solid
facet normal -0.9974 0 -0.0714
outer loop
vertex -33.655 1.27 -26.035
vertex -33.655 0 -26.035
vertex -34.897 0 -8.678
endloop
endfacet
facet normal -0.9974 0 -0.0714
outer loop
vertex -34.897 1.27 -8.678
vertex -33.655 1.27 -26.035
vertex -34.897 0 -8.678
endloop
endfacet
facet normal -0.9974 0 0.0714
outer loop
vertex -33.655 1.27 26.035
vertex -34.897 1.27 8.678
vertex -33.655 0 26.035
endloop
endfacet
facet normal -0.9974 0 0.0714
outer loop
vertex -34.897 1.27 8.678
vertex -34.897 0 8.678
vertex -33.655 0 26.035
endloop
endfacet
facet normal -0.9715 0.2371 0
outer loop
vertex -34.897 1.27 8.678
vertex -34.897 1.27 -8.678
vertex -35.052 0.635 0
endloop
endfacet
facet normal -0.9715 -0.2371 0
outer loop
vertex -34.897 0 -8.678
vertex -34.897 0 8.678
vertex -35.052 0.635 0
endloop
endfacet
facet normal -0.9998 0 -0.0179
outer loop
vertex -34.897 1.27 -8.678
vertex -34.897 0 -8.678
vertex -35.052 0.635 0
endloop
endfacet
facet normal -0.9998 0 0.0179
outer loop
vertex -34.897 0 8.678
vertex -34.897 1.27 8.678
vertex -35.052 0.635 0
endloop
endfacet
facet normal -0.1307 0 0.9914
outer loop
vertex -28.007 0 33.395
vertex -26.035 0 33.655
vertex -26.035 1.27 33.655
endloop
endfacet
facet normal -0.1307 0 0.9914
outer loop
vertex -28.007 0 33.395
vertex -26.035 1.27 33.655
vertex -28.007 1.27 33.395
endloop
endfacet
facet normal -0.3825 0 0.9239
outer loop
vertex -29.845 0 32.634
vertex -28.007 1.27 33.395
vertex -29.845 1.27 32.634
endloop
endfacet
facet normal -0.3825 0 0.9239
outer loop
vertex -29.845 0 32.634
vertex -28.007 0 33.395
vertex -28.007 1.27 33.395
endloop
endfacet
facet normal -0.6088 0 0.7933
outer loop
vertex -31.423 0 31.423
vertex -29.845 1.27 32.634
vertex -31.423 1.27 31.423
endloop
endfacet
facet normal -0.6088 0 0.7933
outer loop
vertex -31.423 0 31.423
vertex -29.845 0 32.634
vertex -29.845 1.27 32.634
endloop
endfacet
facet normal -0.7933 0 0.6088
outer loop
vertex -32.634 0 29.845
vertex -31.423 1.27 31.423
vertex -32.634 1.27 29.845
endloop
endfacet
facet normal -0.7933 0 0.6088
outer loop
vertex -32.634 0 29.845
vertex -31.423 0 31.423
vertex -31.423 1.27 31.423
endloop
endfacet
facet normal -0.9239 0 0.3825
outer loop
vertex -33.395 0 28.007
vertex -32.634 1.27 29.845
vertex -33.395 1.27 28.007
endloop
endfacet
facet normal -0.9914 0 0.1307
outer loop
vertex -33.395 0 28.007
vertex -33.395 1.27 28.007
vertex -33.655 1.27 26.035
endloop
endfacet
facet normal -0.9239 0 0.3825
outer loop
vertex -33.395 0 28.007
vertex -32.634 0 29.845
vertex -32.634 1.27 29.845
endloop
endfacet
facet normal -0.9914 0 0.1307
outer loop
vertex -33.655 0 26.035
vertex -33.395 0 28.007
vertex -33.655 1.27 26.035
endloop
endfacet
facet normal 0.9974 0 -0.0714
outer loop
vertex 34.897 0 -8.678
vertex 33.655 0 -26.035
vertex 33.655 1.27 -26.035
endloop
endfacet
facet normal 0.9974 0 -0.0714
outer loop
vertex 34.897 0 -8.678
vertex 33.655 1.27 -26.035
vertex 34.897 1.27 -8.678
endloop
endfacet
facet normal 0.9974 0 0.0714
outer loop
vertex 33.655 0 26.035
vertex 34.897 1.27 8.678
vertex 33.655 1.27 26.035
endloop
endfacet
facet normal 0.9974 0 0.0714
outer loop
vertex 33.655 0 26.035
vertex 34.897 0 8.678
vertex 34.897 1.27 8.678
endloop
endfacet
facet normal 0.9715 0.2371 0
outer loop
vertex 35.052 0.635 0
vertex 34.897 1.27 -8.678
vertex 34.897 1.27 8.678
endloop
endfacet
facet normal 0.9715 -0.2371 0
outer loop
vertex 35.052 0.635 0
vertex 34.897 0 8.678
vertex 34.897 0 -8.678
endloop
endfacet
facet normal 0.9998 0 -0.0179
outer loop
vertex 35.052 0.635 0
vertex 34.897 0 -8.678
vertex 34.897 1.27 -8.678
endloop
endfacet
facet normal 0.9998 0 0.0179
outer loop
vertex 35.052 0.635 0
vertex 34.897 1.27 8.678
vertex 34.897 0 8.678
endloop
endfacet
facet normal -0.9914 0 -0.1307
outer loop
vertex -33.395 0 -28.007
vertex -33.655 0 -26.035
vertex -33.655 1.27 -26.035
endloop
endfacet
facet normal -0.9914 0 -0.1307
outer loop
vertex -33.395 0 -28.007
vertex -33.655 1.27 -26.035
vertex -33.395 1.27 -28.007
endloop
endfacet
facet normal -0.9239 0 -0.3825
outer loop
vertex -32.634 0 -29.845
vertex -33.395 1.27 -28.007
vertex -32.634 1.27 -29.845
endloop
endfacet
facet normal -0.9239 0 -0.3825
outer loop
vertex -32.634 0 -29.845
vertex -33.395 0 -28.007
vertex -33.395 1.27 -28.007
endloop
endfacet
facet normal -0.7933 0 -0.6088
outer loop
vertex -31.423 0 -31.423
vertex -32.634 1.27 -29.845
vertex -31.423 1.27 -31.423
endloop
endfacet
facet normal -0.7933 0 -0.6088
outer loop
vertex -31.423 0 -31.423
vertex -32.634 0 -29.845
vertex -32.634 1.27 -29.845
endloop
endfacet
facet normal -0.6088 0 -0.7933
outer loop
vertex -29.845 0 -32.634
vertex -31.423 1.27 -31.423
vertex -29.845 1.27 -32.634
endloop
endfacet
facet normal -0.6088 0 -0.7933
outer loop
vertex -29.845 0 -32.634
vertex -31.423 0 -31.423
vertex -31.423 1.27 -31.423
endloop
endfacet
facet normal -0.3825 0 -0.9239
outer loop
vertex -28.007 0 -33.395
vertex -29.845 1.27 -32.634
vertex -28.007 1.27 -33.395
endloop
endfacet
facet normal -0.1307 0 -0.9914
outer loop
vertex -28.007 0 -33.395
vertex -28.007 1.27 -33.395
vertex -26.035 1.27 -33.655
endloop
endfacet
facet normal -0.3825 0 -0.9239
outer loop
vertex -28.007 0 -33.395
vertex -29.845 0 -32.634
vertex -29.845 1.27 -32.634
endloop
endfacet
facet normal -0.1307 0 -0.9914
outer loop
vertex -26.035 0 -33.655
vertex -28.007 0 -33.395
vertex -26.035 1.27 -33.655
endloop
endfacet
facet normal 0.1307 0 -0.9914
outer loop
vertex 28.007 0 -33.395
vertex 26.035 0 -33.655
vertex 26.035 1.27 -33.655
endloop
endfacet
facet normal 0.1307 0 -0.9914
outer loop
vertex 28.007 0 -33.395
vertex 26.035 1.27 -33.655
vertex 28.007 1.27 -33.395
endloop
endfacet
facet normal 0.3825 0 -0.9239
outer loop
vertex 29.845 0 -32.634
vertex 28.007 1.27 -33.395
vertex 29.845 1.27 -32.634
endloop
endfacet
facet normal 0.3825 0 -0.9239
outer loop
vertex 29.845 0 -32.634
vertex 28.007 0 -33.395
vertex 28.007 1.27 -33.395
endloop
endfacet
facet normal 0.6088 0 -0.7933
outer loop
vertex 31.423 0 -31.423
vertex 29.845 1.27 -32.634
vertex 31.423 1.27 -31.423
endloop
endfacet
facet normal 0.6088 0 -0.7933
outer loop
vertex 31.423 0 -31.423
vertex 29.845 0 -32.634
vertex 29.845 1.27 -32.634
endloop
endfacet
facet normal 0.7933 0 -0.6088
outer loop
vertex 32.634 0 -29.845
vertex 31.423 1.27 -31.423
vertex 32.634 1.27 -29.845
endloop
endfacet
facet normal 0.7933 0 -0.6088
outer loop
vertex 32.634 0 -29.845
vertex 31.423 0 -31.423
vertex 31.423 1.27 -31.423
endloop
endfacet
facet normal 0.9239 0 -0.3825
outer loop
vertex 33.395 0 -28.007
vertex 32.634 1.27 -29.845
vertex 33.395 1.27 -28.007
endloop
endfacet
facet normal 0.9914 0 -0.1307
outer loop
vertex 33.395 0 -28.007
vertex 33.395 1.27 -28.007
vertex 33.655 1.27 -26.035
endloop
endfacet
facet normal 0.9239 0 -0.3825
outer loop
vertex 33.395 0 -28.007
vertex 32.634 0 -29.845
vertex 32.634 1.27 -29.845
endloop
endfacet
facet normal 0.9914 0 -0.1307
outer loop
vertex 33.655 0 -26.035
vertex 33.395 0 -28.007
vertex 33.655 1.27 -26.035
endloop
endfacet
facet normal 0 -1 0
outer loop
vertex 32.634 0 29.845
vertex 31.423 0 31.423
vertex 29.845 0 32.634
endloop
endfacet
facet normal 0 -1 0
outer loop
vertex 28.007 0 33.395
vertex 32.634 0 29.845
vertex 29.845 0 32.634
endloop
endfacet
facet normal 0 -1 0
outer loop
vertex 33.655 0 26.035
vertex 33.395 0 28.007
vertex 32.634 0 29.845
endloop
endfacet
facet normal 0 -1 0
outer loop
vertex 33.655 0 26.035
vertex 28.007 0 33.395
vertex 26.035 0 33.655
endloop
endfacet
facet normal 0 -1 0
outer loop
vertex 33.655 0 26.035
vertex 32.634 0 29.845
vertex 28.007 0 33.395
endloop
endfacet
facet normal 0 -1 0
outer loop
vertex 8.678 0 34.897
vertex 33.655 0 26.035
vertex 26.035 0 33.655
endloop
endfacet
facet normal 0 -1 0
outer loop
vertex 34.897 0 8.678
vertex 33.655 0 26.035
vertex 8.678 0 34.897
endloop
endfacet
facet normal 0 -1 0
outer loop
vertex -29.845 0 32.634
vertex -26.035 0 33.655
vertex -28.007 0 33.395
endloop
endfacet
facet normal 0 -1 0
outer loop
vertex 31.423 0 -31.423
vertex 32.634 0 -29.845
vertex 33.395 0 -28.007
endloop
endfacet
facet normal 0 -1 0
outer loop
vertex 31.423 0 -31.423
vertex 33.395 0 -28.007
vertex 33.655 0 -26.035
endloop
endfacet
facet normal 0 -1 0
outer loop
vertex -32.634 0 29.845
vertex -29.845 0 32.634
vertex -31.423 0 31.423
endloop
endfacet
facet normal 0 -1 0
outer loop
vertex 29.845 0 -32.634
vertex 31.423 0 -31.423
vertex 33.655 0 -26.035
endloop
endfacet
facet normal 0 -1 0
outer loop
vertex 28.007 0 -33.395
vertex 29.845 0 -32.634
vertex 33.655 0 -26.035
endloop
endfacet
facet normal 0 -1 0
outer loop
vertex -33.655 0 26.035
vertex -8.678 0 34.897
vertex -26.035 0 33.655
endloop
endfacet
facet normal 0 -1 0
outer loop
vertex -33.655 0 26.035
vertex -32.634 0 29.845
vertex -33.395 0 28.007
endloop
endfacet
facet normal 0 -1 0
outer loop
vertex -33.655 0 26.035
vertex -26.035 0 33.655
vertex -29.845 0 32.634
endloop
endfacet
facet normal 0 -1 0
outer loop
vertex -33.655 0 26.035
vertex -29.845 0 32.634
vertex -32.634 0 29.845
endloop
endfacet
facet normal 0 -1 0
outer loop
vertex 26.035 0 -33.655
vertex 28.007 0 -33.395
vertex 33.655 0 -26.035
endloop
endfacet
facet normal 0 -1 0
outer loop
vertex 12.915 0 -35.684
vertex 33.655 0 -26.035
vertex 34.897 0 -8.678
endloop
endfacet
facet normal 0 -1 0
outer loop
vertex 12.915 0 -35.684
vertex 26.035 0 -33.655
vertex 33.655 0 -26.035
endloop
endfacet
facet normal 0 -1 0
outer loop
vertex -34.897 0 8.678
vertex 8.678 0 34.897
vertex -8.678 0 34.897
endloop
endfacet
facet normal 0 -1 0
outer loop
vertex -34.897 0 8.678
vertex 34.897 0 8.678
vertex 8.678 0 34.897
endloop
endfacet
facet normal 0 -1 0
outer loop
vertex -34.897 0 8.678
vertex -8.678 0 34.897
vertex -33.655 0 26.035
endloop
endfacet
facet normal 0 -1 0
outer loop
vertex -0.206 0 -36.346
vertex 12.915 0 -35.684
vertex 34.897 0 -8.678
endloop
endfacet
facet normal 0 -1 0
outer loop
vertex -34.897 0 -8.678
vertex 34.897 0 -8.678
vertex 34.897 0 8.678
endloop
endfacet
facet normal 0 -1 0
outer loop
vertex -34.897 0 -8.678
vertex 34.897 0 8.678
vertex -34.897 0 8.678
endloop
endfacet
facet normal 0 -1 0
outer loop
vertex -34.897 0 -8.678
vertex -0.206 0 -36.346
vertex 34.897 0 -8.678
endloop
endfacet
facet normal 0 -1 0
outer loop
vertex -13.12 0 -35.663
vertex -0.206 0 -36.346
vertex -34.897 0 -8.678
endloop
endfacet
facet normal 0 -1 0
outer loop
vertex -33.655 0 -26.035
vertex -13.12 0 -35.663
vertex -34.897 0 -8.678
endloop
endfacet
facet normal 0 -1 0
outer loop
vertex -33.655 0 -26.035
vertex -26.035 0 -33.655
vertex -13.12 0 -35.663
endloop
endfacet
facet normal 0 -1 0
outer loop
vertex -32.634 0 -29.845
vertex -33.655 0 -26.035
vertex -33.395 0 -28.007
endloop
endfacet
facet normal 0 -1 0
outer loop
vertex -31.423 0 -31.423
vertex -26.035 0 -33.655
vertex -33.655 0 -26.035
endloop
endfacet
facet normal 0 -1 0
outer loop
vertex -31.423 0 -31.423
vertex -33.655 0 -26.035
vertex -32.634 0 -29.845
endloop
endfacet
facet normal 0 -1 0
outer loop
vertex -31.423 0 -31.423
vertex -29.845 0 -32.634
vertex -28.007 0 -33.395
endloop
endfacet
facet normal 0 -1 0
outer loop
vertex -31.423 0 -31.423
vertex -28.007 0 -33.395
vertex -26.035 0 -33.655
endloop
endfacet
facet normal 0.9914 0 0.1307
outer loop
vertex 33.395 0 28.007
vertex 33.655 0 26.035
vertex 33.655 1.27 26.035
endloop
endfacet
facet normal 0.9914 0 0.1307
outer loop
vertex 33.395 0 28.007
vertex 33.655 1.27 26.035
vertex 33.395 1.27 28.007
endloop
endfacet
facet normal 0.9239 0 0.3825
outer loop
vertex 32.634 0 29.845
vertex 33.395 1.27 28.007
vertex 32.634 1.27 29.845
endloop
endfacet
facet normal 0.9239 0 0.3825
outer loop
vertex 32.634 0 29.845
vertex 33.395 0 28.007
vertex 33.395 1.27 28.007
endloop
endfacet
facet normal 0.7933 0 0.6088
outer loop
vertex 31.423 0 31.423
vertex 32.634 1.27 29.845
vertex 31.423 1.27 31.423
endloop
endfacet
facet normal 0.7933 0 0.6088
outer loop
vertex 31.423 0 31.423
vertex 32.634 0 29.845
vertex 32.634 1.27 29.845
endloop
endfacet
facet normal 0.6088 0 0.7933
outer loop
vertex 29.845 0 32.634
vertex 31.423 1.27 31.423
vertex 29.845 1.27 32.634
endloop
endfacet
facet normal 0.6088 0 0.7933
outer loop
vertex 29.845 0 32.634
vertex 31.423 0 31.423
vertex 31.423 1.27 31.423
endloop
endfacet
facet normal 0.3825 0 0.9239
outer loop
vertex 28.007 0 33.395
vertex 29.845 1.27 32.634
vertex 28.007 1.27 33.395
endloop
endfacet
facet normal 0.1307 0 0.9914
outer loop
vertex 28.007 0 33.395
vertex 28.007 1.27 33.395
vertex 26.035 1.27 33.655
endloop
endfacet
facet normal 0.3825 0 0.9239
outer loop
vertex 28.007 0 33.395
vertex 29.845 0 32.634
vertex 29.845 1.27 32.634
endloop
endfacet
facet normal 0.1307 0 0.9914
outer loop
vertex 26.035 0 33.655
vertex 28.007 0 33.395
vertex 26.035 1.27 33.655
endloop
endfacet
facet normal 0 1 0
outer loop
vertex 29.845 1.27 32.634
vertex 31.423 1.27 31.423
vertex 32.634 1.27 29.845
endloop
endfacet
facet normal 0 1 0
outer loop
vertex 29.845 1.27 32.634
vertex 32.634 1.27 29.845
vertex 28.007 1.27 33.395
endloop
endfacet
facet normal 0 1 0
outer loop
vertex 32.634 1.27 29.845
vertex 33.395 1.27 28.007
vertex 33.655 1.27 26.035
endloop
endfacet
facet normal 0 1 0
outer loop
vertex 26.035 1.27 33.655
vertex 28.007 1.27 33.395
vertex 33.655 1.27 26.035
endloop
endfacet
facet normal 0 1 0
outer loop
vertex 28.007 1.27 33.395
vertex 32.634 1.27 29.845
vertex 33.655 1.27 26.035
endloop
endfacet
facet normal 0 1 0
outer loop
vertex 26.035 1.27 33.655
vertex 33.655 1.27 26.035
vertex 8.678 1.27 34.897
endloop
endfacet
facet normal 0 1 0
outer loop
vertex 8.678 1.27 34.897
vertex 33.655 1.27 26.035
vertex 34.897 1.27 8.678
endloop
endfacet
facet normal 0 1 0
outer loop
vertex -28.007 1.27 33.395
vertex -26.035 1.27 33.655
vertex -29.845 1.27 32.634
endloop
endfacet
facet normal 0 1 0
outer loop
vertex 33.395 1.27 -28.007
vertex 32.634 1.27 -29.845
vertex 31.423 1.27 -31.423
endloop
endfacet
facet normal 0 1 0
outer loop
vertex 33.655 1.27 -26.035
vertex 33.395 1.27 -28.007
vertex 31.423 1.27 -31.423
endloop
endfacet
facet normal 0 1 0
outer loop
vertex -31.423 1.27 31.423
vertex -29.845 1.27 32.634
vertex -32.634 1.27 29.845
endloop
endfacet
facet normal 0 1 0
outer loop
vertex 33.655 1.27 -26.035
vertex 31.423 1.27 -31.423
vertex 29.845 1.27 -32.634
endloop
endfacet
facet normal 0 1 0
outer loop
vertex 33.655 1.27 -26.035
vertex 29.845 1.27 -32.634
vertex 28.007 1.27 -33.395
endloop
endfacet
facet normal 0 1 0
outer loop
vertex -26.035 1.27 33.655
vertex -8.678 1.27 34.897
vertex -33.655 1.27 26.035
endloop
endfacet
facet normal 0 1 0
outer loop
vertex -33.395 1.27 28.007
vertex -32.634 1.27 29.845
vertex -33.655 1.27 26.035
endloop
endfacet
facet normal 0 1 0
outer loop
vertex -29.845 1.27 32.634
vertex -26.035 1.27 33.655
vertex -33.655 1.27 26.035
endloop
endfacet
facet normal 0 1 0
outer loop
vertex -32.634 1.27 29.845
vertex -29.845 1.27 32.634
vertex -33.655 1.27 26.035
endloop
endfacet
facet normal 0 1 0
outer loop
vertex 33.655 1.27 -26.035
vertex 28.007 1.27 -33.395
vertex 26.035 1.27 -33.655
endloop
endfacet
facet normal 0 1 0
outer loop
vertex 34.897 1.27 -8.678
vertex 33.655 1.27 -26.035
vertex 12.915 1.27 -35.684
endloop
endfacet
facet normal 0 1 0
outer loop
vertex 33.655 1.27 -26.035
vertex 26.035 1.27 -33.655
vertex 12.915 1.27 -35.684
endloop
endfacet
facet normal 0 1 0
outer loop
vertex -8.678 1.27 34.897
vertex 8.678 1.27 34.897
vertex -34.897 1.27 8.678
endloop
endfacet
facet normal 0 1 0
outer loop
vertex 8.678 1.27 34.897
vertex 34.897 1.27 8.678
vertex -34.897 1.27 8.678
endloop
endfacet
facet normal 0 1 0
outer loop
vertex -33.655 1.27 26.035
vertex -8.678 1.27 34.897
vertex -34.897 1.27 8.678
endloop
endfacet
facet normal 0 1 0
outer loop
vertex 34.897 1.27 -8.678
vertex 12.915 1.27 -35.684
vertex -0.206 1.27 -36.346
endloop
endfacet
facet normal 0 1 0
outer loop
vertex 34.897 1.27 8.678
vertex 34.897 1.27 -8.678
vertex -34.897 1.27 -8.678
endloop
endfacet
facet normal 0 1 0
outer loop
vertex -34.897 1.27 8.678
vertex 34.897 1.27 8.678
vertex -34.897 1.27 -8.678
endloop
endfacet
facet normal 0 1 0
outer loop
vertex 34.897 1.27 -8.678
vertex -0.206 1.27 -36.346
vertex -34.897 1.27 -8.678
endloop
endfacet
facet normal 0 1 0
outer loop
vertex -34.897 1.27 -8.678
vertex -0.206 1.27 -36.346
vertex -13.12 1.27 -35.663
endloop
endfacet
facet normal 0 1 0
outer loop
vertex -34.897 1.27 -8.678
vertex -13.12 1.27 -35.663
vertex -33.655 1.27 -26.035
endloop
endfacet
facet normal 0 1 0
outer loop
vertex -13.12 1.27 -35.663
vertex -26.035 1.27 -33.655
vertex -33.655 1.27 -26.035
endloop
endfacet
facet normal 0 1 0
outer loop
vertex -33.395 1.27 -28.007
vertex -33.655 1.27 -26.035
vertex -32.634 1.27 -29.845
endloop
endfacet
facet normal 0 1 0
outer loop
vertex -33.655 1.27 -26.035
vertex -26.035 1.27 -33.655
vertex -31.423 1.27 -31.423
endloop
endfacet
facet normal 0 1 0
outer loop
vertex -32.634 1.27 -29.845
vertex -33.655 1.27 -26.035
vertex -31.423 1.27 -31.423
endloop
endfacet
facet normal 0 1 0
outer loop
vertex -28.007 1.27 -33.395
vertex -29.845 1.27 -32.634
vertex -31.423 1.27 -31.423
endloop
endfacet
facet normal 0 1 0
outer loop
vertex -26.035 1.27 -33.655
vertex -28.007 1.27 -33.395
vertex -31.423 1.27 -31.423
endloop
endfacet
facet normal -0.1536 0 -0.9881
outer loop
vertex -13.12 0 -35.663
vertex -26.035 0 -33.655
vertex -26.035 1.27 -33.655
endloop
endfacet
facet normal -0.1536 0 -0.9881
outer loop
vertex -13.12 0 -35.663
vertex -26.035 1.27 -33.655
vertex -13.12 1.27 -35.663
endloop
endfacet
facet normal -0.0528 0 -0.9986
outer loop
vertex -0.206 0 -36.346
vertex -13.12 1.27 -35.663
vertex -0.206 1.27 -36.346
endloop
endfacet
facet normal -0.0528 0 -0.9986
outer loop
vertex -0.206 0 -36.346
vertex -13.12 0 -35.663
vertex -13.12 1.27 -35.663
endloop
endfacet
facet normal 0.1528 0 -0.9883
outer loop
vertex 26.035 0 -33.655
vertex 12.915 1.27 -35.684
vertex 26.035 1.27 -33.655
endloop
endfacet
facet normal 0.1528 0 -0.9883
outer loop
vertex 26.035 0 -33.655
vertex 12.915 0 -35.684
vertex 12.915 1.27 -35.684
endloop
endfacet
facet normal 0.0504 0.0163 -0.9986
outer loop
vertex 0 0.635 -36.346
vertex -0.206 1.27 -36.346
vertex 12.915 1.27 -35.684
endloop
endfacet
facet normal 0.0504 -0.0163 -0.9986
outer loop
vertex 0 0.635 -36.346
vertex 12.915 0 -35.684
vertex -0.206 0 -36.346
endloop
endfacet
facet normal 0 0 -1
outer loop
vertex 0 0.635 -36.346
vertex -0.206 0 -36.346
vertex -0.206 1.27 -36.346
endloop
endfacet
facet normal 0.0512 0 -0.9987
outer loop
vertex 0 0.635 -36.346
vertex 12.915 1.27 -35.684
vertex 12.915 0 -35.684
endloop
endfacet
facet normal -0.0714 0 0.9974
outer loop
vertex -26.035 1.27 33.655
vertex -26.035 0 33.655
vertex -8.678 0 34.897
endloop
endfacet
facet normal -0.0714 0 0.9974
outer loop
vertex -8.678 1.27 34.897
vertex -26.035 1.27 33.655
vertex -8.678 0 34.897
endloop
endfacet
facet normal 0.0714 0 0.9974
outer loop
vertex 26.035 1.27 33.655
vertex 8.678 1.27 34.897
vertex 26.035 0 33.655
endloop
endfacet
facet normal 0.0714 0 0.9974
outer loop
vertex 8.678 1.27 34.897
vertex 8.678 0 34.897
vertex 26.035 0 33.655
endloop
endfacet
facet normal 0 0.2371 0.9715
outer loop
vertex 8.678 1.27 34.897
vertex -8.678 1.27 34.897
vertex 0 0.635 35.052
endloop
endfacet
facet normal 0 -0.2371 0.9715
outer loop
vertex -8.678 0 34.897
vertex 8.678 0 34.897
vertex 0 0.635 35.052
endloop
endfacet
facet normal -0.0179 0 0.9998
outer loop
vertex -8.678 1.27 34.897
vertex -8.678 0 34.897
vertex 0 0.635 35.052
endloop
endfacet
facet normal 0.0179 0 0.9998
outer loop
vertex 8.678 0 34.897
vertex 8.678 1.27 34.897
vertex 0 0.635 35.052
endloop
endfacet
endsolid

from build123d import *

# Parameters (mm, degrees)
BOSS_EXTRUDE1_DEPTH = 1.27


with BuildPart() as part:
    # Sketch1 → Boss-Extrude1 (new body)
    with BuildSketch(Plane(origin=(0, 0, 0), x_dir=(1, 0, 0), z_dir=(0, 1, 0))):
        with BuildLine():
            ThreePointArc((26.035, 33.655), (31.423153673, 31.423153673), (33.655, 26.035))
            add(Edge.make_bspline(
                [(33.655, 26.035), (36.449, 0), (33.655, -26.035)],
                knots=[0, 0, 0, 1, 1, 1], degree=2))
            ThreePointArc((33.655, -26.035), (31.423153673, -31.423153673), (26.035, -33.655))
            add(Edge.make_bspline(
                [(-26.035, -33.655), (0, -36.449), (26.035, -33.655)],
                knots=[0, 0, 0, 1, 1, 1], degree=2))
            ThreePointArc((-26.035, -33.655), (-31.423153673, -31.423153673), (-33.655, -26.035))
            add(Edge.make_bspline(
                [(-33.655, 26.035), (-36.449, 0), (-33.655, -26.035)],
                knots=[0, 0, 0, 1, 1, 1], degree=2))
            ThreePointArc((-33.655, 26.035), (-31.423153673, 31.423153673), (-26.035, 33.655))
            add(Edge.make_bspline(
                [(-26.035, 33.655), (0, 39.037083155), (26.035, 33.655)],
                knots=[0, 0, 0, 1, 1, 1], degree=2))
        make_face()
    extrude(amount=BOSS_EXTRUDE1_DEPTH)


solid = part.part
